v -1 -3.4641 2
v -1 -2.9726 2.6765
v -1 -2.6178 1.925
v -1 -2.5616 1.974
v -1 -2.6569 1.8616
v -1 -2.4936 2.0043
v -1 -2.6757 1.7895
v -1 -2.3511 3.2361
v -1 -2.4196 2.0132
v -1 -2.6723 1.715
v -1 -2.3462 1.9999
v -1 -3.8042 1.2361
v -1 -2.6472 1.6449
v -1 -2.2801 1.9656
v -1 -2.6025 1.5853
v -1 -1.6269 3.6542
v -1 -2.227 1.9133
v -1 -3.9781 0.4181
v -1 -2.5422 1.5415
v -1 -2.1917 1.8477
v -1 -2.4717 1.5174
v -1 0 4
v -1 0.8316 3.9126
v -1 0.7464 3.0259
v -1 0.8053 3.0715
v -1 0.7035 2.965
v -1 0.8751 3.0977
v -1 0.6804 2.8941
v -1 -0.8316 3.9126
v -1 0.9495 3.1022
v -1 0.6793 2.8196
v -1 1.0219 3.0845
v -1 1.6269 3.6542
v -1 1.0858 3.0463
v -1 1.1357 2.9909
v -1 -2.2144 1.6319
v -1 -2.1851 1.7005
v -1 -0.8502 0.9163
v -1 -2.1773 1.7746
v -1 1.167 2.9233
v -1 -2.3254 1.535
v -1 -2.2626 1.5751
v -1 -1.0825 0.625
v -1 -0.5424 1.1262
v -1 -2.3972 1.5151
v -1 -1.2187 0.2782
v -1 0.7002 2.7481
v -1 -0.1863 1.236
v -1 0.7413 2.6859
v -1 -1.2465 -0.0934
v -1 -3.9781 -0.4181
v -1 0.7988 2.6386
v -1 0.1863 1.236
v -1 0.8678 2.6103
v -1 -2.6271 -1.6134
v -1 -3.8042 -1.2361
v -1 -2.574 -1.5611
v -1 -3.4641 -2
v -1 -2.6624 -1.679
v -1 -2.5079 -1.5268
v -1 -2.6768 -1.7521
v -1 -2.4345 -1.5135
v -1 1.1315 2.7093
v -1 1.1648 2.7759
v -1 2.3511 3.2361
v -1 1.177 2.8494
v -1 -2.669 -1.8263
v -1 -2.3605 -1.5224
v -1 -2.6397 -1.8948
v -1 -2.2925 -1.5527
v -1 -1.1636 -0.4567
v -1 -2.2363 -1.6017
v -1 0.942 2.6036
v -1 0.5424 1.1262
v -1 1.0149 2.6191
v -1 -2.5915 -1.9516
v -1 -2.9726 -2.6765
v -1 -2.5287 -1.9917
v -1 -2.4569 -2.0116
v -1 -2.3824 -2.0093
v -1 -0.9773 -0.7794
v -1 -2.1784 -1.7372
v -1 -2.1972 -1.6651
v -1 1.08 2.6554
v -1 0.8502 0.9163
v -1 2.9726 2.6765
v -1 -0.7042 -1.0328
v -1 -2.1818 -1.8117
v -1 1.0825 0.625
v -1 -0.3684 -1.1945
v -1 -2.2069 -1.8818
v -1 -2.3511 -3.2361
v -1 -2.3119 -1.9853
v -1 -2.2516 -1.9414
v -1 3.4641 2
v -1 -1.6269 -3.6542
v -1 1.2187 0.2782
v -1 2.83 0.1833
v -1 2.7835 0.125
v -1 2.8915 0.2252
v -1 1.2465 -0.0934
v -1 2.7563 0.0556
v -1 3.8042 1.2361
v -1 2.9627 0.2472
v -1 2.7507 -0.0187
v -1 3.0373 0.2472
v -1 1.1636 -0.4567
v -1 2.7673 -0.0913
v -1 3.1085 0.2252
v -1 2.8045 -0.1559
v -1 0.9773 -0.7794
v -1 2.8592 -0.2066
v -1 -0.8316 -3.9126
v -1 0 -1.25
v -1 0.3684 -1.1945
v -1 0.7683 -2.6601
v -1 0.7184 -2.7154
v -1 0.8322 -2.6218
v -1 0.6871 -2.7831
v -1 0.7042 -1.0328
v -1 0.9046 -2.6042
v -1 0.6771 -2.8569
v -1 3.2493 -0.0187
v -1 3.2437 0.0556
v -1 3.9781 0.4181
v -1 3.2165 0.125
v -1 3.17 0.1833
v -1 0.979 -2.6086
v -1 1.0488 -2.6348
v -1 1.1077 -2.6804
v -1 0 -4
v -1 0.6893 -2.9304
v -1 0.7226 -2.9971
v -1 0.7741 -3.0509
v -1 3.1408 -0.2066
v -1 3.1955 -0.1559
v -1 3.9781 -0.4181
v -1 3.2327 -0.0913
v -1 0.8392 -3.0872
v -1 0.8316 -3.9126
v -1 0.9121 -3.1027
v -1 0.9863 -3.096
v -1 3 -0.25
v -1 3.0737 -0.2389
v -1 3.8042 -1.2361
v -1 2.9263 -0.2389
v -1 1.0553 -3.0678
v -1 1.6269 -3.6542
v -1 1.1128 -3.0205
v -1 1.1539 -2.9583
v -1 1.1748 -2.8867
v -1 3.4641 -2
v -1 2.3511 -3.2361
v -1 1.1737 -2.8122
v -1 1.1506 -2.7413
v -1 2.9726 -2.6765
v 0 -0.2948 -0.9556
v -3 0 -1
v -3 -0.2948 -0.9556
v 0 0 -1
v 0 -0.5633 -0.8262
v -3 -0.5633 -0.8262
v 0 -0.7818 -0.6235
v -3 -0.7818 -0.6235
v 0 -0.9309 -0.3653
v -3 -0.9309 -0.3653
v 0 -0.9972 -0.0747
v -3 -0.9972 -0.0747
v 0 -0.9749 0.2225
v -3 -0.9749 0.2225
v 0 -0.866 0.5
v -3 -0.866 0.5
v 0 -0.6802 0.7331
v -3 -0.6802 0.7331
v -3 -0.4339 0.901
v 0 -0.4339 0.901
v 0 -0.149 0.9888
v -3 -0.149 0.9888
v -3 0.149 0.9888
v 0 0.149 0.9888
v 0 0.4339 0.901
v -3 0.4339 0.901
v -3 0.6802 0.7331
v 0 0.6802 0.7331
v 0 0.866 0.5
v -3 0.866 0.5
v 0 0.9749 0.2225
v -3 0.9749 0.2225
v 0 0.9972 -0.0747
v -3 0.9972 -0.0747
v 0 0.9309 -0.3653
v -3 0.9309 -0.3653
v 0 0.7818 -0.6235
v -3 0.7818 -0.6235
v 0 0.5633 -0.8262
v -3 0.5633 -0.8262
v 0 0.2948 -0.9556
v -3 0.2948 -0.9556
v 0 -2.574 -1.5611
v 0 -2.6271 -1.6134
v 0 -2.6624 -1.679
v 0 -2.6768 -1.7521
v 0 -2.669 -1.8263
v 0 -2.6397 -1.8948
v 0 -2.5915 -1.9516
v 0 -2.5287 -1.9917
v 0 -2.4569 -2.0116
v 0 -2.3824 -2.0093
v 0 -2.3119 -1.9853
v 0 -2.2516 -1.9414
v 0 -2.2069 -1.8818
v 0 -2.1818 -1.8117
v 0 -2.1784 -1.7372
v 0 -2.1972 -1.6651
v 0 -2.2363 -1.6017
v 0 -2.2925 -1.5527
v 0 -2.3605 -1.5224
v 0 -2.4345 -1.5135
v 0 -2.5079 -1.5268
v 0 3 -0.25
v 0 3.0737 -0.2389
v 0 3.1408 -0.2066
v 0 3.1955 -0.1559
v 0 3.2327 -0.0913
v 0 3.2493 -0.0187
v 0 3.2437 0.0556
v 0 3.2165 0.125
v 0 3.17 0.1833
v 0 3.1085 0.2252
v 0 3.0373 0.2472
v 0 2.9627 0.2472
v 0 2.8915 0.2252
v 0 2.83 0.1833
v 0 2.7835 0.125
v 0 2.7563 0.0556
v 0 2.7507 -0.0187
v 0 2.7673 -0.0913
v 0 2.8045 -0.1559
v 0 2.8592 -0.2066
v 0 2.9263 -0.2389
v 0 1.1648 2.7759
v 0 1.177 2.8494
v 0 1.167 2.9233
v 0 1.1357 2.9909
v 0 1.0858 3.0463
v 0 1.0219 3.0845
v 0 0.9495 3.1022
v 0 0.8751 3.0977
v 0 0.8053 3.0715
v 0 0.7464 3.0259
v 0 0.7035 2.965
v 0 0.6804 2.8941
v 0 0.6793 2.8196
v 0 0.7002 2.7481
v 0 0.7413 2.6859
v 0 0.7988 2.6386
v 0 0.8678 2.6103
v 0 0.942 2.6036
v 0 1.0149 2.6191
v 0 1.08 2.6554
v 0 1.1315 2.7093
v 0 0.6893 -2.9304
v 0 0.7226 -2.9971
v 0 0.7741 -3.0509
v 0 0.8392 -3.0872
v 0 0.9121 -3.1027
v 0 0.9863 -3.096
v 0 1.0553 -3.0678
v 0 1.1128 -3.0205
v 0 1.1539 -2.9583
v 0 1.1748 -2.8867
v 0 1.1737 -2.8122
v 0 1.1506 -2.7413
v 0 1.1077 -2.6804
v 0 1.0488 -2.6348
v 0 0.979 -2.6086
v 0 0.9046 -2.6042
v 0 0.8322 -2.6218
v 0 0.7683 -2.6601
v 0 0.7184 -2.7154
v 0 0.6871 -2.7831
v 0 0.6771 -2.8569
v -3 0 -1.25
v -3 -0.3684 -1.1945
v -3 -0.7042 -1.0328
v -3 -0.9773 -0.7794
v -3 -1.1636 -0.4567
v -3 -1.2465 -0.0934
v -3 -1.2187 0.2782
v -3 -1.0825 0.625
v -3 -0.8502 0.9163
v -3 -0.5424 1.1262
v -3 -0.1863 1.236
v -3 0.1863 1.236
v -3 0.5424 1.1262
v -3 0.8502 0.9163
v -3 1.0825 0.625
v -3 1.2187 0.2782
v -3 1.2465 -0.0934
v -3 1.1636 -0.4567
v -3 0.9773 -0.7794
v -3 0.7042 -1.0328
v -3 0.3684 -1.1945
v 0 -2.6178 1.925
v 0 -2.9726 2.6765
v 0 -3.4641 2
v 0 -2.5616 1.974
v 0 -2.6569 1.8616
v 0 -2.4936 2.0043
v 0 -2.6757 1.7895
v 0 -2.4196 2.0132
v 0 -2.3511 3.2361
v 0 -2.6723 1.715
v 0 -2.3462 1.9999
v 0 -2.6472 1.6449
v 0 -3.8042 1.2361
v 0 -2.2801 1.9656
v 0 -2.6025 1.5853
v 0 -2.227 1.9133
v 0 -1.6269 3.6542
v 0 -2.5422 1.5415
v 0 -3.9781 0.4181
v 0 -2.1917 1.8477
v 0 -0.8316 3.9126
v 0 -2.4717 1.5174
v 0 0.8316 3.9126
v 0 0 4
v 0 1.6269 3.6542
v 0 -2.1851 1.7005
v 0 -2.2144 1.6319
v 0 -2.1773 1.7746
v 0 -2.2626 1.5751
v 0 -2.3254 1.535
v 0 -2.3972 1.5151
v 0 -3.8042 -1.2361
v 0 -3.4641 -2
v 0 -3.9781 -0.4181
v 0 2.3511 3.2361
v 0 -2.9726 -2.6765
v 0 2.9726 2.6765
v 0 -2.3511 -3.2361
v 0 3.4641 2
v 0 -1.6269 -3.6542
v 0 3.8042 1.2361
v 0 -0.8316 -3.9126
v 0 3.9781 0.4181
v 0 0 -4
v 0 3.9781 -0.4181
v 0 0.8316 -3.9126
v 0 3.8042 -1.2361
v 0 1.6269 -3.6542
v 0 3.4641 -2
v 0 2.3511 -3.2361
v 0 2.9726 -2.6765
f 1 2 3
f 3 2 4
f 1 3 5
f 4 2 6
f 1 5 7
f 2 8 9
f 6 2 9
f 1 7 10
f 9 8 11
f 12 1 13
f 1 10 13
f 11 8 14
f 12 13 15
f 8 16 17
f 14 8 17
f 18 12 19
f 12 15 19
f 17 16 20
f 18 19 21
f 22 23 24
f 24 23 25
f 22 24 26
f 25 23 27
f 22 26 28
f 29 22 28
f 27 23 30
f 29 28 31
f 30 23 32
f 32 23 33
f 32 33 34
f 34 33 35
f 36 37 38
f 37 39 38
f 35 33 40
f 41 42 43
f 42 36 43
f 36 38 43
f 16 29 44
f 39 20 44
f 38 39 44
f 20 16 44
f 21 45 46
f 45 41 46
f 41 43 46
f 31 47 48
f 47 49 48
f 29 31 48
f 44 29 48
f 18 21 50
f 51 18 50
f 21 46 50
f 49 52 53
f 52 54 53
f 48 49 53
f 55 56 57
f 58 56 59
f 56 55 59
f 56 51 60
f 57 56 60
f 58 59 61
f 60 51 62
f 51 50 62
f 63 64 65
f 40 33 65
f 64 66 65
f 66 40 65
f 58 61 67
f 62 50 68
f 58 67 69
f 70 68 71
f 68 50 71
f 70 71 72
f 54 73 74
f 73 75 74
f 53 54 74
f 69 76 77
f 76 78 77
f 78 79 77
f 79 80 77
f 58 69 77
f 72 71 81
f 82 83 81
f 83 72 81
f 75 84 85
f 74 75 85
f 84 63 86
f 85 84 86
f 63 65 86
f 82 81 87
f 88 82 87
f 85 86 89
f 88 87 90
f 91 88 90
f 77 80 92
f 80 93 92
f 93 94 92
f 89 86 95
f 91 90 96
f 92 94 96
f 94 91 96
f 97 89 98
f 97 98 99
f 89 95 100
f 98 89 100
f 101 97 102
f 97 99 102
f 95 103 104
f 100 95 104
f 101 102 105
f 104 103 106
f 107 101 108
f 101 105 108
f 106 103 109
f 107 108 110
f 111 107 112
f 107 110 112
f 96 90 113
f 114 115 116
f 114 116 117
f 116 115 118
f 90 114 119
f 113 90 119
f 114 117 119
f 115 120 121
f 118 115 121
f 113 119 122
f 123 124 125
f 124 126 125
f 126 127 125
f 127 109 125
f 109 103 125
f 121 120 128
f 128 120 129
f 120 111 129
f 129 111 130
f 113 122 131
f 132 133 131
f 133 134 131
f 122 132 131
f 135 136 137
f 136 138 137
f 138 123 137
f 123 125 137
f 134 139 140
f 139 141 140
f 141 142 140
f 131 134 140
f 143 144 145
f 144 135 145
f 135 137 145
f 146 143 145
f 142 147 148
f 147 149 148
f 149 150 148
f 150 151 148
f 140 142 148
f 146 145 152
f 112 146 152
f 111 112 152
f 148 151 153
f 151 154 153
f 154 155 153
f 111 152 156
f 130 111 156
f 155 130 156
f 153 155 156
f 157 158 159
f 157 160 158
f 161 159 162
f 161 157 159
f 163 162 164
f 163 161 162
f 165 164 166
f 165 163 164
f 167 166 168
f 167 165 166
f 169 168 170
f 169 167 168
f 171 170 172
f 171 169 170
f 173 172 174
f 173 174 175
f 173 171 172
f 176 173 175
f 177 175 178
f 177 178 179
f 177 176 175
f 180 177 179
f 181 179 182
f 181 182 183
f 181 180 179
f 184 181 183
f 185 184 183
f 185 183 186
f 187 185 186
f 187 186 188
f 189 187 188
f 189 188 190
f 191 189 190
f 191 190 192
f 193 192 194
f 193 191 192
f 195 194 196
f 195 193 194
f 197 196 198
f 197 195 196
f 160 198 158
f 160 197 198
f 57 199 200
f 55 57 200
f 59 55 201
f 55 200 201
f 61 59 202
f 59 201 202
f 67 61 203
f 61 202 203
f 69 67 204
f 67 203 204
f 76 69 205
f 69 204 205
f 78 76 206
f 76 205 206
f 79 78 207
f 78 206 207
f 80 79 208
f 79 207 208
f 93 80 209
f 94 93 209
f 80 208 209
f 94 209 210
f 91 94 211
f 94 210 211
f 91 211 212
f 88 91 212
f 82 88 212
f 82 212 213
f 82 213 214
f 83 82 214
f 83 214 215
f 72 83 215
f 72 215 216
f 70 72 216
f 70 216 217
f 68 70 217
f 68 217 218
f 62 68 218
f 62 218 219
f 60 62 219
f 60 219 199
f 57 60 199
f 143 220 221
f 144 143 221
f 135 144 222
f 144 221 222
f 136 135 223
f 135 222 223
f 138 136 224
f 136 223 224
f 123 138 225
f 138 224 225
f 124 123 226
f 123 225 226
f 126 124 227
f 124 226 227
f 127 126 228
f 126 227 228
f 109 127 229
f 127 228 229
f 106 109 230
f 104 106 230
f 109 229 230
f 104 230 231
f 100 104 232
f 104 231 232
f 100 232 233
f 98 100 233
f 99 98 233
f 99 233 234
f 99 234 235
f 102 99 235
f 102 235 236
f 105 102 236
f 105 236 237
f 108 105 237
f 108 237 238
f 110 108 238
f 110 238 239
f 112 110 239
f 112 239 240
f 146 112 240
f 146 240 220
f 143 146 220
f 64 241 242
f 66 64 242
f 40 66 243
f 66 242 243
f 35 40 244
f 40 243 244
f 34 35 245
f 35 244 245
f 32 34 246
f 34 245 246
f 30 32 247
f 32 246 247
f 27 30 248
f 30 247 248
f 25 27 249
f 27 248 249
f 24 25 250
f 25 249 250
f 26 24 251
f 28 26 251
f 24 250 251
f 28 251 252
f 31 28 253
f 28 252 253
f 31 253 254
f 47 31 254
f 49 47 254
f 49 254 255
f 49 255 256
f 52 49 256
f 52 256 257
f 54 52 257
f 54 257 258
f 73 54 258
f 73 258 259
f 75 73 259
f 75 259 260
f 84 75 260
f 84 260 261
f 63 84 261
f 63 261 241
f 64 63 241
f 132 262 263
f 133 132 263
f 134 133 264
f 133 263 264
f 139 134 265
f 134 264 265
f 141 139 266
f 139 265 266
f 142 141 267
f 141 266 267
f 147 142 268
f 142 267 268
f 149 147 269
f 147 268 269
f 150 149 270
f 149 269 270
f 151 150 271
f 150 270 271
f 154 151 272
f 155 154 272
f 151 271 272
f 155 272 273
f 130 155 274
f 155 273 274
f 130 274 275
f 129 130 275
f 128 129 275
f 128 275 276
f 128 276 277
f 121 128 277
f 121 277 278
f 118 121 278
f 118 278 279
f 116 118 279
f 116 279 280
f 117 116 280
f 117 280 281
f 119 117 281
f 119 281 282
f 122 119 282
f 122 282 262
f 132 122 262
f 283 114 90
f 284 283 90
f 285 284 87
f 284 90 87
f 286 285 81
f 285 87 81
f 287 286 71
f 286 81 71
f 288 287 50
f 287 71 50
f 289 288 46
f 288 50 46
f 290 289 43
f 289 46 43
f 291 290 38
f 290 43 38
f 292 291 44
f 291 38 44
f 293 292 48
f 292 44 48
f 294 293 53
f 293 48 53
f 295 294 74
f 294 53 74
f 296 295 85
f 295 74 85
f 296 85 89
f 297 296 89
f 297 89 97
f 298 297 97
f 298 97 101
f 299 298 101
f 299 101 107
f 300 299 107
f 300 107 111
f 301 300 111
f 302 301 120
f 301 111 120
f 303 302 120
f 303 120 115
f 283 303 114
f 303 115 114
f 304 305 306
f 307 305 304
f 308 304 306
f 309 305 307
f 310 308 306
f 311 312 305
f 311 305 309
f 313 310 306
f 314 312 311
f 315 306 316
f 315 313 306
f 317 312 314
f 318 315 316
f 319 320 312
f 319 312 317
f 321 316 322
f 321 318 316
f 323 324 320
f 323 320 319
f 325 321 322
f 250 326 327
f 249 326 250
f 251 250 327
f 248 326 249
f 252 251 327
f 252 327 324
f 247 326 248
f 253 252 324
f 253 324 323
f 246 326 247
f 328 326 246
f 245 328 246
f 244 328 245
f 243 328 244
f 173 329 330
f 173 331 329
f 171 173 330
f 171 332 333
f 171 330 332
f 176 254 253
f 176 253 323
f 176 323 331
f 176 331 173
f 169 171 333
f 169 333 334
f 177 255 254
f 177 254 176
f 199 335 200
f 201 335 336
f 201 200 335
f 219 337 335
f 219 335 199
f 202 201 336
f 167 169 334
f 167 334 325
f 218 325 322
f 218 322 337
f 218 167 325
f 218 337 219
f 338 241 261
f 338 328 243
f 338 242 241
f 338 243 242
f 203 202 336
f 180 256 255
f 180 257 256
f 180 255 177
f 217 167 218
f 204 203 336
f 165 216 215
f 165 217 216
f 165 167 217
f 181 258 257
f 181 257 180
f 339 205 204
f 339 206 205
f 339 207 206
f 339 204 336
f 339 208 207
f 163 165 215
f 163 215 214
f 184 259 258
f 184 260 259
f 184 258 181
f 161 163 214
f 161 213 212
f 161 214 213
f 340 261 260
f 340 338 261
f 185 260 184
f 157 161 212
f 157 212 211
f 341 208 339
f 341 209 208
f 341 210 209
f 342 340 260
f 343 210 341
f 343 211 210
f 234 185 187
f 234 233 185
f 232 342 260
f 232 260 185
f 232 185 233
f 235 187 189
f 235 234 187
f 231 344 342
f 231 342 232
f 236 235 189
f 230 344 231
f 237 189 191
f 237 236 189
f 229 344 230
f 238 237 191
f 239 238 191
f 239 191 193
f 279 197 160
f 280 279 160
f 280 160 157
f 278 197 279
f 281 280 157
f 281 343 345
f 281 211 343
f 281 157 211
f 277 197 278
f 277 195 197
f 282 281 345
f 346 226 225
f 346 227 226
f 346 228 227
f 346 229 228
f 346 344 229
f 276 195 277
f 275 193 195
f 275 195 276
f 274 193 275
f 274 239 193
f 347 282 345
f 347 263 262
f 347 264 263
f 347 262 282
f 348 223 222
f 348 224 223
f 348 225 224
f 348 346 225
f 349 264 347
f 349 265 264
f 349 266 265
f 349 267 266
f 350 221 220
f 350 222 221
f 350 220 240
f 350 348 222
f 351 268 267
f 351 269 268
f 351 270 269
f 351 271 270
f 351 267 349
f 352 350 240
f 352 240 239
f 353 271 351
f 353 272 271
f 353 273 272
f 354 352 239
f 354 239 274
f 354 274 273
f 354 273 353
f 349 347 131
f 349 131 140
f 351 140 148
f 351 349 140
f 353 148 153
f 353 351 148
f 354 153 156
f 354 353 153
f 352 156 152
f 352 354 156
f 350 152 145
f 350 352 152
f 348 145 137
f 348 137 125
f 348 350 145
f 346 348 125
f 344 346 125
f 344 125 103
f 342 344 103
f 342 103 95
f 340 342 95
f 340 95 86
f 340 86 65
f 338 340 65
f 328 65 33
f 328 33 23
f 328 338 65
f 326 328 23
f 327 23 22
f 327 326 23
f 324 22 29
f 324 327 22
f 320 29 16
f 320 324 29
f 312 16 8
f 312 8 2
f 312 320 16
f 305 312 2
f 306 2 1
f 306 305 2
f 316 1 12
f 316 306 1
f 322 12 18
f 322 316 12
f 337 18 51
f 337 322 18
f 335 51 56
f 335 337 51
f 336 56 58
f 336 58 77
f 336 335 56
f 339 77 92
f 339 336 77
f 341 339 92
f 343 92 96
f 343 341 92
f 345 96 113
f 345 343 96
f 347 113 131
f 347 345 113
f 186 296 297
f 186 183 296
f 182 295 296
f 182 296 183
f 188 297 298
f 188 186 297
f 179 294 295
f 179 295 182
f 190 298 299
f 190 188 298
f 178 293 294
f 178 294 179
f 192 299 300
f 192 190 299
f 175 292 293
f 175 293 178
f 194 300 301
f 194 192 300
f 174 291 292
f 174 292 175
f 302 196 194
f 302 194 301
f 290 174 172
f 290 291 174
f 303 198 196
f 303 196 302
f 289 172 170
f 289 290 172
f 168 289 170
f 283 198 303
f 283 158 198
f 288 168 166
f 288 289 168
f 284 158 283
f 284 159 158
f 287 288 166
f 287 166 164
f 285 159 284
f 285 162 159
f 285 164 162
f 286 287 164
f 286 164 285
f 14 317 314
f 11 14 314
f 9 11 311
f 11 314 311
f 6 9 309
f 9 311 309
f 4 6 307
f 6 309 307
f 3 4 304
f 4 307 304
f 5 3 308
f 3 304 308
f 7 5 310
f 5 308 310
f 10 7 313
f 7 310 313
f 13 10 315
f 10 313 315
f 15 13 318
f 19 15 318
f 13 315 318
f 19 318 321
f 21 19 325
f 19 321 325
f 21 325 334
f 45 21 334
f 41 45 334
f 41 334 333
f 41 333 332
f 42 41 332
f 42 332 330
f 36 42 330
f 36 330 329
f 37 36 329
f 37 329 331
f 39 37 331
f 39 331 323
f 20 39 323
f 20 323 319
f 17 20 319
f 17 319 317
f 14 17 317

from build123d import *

# Parameters (mm, degrees)
SKETCH2_R           = 4
BOSS_EXTRUDE1_DEPTH = 1
SKETCH4_R           = 1
CUT_EXTRUDE1_DEPTH  = 2.5
SKETCH6_R           = 1.25
SKETCH6_R_2         = 1
BOSS_EXTRUDE4_DEPTH = 2
SKETCH5_R           = 0.25
CUT_EXTRUDE2_DEPTH  = 2
CIRPATTERN1_COUNT   = 5


with BuildPart() as part:
    # Sketch2 → Boss-Extrude1 (new body)
    with BuildSketch(Plane(origin=(0, 0, 0), x_dir=(0, 0, -1), z_dir=(1, 0, 0))):
        Circle(SKETCH2_R)
    extrude(amount=-BOSS_EXTRUDE1_DEPTH)

    # Sketch4 → Cut-Extrude1 (cut)
    with BuildSketch(Plane(origin=(0, 0, 0), x_dir=(0, 0, -1), z_dir=(1, 0, 0))):
        Circle(SKETCH4_R)
    extrude(amount=-CUT_EXTRUDE1_DEPTH, mode=Mode.SUBTRACT)

    # Sketch6 → Boss-Extrude4 (add)
    with BuildSketch(Plane.ZY.offset(1)):
        with Locations(Location((0, 0, 0), (0, 0, 180))):
            Circle(SKETCH6_R)
        with Locations(Location((0, 0, 0), (0, 0, 180))):
            Circle(SKETCH6_R_2, mode=Mode.SUBTRACT)
    extrude(amount=BOSS_EXTRUDE4_DEPTH)

    # Sketch5 → Cut-Extrude2 (cut)
    with BuildSketch(Plane(origin=(0, 0, 0), x_dir=(0, 0, -1), z_dir=(1, 0, 0))):
        with Locations((0, 3)):
            Circle(SKETCH5_R)
    cut_extrude2 = extrude(amount=-CUT_EXTRUDE2_DEPTH, mode=Mode.SUBTRACT)

    # CirPattern1: Cut-Extrude2 ×5 about axis
    cirpattern1_axis = Axis((0, 0, 0), (1, 0, 0))
    for i in range(1, CIRPATTERN1_COUNT):
        add(cut_extrude2.rotate(cirpattern1_axis, i * 360 / CIRPATTERN1_COUNT), mode=Mode.SUBTRACT)


solid = part.part
